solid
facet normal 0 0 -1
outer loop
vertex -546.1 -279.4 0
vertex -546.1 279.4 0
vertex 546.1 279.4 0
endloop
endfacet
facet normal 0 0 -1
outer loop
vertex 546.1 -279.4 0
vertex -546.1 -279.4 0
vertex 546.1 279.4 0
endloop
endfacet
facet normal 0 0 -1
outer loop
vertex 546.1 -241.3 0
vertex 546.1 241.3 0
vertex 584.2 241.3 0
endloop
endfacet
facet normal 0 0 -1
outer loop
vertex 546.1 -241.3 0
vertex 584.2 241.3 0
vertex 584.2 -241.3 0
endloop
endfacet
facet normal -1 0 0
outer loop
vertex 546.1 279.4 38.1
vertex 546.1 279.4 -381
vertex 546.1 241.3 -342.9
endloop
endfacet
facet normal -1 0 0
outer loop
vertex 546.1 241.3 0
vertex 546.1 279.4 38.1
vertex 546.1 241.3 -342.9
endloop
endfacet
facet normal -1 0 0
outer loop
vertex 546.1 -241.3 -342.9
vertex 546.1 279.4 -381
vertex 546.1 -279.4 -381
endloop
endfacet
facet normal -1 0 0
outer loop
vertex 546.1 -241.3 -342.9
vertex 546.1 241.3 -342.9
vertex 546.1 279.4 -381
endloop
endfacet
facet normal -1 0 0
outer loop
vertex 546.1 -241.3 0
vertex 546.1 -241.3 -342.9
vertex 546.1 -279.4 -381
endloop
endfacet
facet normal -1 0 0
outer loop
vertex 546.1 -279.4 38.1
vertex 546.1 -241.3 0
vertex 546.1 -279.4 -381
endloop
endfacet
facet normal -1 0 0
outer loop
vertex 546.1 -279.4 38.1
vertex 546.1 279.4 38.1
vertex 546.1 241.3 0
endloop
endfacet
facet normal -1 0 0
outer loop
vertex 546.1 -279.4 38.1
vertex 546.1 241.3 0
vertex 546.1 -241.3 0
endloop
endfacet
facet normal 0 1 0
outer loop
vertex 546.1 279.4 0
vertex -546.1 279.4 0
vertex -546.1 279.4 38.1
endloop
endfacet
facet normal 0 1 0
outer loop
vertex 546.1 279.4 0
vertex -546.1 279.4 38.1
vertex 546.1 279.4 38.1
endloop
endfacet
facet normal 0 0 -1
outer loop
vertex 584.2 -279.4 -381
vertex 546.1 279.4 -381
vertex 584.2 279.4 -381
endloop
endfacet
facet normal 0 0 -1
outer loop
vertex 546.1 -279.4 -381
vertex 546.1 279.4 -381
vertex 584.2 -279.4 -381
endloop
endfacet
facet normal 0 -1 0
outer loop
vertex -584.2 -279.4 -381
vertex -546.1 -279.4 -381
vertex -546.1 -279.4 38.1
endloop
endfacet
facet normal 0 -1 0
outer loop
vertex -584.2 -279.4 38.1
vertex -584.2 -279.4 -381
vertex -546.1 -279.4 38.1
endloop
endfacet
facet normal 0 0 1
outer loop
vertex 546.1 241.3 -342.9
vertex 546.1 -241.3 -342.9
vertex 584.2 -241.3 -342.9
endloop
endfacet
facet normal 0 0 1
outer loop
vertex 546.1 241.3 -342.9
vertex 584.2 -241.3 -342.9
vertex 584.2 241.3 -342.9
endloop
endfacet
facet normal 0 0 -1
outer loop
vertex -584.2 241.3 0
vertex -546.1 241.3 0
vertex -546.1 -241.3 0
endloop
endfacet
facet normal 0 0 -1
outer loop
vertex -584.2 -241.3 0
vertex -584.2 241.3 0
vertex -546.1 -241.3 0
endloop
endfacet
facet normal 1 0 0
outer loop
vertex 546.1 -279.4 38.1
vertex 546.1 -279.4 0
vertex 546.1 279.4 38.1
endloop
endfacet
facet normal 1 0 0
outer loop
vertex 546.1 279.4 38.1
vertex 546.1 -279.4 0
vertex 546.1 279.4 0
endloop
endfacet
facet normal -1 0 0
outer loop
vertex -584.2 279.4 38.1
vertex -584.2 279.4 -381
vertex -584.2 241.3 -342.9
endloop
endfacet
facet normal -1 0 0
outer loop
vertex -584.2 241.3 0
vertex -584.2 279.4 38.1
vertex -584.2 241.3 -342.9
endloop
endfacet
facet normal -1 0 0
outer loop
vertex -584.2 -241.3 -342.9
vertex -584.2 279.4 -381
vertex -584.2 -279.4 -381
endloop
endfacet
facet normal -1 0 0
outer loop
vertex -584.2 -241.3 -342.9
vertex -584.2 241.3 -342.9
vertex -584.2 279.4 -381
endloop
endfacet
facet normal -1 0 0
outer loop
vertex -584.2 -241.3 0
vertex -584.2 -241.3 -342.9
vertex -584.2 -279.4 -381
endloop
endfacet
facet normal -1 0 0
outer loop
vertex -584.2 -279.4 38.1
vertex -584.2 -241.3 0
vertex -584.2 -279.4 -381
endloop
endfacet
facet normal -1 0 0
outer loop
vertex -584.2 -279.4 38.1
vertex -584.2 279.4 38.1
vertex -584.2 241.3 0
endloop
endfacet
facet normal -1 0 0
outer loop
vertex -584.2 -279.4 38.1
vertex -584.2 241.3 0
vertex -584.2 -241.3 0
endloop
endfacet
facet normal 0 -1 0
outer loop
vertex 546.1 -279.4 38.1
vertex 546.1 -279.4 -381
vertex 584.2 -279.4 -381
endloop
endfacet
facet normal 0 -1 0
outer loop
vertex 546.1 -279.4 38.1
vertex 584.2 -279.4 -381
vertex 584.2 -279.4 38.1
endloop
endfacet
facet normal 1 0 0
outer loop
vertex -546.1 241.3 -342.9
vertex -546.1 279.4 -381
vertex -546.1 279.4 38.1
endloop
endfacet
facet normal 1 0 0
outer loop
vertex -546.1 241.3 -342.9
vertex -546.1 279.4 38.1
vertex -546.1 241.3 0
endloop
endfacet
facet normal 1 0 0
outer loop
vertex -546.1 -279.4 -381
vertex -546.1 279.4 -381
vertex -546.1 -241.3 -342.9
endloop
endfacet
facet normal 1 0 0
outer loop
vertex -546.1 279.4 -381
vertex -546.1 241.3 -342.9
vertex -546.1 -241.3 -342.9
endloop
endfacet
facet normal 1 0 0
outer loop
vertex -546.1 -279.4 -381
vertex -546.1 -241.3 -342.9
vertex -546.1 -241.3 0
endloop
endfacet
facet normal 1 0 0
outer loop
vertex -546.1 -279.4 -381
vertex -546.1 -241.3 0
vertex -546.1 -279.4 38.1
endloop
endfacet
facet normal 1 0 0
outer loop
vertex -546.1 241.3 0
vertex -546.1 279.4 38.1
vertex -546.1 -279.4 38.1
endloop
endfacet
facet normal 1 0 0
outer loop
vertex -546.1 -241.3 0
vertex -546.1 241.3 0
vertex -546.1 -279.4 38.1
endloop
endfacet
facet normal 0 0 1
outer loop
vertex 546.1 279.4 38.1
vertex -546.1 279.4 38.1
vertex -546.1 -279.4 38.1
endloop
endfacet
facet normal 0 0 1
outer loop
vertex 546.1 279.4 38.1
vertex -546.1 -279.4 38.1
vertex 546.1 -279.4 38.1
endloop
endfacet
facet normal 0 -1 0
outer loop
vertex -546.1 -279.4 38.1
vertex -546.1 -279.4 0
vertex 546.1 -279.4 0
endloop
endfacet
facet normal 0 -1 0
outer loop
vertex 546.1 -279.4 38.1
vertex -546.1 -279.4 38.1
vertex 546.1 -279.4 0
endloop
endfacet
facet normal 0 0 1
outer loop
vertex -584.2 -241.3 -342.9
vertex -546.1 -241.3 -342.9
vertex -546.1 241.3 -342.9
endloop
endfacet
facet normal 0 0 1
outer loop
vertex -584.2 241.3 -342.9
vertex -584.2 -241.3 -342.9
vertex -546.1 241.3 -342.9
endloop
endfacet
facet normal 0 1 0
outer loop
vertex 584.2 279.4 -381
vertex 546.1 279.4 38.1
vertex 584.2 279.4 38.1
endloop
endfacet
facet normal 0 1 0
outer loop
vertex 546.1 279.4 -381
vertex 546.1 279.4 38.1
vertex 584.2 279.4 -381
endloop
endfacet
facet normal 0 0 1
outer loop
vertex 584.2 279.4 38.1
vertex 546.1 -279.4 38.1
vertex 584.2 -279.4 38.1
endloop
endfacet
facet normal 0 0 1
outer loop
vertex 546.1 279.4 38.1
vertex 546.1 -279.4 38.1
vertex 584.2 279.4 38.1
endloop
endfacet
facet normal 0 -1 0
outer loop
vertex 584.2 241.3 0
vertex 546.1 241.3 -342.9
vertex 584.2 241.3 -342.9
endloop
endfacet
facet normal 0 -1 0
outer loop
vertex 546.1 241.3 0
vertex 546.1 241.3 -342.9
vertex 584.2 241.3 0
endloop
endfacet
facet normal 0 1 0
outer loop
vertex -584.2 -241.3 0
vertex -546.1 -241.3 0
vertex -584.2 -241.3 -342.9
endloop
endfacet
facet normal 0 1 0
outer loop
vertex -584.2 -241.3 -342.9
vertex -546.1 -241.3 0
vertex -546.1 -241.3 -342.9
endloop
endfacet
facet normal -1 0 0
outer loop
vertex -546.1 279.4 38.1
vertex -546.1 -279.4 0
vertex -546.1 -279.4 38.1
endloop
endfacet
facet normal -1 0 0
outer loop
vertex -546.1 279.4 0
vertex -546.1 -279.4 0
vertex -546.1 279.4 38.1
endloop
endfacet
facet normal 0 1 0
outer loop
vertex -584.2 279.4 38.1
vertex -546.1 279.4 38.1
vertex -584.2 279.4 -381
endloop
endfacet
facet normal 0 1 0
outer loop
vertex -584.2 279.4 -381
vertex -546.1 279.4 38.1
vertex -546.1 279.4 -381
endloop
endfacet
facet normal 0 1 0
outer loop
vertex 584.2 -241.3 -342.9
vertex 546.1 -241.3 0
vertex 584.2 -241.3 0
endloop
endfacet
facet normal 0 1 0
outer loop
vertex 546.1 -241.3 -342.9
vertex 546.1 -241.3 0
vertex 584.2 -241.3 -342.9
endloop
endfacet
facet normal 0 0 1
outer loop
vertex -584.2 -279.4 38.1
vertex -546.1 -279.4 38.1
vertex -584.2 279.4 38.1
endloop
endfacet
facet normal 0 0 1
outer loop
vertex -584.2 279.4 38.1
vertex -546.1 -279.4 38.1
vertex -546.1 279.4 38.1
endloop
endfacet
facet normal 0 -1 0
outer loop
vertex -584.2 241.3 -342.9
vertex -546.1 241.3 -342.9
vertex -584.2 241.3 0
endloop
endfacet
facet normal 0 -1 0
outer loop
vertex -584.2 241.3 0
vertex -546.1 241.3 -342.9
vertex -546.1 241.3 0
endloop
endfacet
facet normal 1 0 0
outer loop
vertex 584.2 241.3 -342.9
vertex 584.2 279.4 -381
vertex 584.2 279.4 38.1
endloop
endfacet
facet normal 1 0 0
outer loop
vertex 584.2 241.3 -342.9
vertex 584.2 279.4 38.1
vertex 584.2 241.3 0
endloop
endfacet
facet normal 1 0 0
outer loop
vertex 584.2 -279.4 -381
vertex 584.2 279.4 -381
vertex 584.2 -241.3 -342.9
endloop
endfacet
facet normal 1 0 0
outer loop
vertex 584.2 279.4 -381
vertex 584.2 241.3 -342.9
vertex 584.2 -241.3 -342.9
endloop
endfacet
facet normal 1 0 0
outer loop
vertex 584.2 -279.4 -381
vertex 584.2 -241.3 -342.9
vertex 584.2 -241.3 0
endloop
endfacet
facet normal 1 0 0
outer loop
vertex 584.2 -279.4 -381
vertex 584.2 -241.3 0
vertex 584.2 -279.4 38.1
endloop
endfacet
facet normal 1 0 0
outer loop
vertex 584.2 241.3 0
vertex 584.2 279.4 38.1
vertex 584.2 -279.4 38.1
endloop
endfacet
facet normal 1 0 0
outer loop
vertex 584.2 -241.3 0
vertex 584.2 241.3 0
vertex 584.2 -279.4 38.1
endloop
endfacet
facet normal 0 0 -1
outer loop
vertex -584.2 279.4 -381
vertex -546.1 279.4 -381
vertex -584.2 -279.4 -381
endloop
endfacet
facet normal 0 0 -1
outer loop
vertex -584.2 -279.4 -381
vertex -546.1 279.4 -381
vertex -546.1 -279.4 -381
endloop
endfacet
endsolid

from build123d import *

# Parameters (mm, degrees)
F0_W     = 1092.2
F0_H     = 558.8
F1_DEPTH = 38.1
F3_DEPTH = 38.1


with BuildPart() as f1:
    # F0 (on Top) → F1 (new body)
    with BuildSketch(Plane.XY):
        Rectangle(F0_W, F0_H)
    extrude(amount=F1_DEPTH)


with BuildPart() as f3:
    # F2 (on face) → F3 (new body)
    with BuildSketch(Plane(origin=(-546.1, 0, 0), x_dir=(0, -1, 0), z_dir=(-1, 0, 0))):
        Polygon((279.4, 38.1), (-279.4, 38.1), (-279.4, 0), (-241.3, 0), (241.3, 0), (279.4, 0), align=None)
        Polygon((-241.3, 0), (-279.4, 0), (-279.4, -381), (279.4, -381), (279.4, 0), (241.3, 0), (241.3, -342.9), (-241.3, -342.9), align=None)
    extrude(amount=F3_DEPTH)


with BuildPart() as f4_1:
    # F4: instance of F3
    add(f3.part.mirror(Plane.YZ))


solid = Compound([f1.part, f3.part, f4_1.part])
